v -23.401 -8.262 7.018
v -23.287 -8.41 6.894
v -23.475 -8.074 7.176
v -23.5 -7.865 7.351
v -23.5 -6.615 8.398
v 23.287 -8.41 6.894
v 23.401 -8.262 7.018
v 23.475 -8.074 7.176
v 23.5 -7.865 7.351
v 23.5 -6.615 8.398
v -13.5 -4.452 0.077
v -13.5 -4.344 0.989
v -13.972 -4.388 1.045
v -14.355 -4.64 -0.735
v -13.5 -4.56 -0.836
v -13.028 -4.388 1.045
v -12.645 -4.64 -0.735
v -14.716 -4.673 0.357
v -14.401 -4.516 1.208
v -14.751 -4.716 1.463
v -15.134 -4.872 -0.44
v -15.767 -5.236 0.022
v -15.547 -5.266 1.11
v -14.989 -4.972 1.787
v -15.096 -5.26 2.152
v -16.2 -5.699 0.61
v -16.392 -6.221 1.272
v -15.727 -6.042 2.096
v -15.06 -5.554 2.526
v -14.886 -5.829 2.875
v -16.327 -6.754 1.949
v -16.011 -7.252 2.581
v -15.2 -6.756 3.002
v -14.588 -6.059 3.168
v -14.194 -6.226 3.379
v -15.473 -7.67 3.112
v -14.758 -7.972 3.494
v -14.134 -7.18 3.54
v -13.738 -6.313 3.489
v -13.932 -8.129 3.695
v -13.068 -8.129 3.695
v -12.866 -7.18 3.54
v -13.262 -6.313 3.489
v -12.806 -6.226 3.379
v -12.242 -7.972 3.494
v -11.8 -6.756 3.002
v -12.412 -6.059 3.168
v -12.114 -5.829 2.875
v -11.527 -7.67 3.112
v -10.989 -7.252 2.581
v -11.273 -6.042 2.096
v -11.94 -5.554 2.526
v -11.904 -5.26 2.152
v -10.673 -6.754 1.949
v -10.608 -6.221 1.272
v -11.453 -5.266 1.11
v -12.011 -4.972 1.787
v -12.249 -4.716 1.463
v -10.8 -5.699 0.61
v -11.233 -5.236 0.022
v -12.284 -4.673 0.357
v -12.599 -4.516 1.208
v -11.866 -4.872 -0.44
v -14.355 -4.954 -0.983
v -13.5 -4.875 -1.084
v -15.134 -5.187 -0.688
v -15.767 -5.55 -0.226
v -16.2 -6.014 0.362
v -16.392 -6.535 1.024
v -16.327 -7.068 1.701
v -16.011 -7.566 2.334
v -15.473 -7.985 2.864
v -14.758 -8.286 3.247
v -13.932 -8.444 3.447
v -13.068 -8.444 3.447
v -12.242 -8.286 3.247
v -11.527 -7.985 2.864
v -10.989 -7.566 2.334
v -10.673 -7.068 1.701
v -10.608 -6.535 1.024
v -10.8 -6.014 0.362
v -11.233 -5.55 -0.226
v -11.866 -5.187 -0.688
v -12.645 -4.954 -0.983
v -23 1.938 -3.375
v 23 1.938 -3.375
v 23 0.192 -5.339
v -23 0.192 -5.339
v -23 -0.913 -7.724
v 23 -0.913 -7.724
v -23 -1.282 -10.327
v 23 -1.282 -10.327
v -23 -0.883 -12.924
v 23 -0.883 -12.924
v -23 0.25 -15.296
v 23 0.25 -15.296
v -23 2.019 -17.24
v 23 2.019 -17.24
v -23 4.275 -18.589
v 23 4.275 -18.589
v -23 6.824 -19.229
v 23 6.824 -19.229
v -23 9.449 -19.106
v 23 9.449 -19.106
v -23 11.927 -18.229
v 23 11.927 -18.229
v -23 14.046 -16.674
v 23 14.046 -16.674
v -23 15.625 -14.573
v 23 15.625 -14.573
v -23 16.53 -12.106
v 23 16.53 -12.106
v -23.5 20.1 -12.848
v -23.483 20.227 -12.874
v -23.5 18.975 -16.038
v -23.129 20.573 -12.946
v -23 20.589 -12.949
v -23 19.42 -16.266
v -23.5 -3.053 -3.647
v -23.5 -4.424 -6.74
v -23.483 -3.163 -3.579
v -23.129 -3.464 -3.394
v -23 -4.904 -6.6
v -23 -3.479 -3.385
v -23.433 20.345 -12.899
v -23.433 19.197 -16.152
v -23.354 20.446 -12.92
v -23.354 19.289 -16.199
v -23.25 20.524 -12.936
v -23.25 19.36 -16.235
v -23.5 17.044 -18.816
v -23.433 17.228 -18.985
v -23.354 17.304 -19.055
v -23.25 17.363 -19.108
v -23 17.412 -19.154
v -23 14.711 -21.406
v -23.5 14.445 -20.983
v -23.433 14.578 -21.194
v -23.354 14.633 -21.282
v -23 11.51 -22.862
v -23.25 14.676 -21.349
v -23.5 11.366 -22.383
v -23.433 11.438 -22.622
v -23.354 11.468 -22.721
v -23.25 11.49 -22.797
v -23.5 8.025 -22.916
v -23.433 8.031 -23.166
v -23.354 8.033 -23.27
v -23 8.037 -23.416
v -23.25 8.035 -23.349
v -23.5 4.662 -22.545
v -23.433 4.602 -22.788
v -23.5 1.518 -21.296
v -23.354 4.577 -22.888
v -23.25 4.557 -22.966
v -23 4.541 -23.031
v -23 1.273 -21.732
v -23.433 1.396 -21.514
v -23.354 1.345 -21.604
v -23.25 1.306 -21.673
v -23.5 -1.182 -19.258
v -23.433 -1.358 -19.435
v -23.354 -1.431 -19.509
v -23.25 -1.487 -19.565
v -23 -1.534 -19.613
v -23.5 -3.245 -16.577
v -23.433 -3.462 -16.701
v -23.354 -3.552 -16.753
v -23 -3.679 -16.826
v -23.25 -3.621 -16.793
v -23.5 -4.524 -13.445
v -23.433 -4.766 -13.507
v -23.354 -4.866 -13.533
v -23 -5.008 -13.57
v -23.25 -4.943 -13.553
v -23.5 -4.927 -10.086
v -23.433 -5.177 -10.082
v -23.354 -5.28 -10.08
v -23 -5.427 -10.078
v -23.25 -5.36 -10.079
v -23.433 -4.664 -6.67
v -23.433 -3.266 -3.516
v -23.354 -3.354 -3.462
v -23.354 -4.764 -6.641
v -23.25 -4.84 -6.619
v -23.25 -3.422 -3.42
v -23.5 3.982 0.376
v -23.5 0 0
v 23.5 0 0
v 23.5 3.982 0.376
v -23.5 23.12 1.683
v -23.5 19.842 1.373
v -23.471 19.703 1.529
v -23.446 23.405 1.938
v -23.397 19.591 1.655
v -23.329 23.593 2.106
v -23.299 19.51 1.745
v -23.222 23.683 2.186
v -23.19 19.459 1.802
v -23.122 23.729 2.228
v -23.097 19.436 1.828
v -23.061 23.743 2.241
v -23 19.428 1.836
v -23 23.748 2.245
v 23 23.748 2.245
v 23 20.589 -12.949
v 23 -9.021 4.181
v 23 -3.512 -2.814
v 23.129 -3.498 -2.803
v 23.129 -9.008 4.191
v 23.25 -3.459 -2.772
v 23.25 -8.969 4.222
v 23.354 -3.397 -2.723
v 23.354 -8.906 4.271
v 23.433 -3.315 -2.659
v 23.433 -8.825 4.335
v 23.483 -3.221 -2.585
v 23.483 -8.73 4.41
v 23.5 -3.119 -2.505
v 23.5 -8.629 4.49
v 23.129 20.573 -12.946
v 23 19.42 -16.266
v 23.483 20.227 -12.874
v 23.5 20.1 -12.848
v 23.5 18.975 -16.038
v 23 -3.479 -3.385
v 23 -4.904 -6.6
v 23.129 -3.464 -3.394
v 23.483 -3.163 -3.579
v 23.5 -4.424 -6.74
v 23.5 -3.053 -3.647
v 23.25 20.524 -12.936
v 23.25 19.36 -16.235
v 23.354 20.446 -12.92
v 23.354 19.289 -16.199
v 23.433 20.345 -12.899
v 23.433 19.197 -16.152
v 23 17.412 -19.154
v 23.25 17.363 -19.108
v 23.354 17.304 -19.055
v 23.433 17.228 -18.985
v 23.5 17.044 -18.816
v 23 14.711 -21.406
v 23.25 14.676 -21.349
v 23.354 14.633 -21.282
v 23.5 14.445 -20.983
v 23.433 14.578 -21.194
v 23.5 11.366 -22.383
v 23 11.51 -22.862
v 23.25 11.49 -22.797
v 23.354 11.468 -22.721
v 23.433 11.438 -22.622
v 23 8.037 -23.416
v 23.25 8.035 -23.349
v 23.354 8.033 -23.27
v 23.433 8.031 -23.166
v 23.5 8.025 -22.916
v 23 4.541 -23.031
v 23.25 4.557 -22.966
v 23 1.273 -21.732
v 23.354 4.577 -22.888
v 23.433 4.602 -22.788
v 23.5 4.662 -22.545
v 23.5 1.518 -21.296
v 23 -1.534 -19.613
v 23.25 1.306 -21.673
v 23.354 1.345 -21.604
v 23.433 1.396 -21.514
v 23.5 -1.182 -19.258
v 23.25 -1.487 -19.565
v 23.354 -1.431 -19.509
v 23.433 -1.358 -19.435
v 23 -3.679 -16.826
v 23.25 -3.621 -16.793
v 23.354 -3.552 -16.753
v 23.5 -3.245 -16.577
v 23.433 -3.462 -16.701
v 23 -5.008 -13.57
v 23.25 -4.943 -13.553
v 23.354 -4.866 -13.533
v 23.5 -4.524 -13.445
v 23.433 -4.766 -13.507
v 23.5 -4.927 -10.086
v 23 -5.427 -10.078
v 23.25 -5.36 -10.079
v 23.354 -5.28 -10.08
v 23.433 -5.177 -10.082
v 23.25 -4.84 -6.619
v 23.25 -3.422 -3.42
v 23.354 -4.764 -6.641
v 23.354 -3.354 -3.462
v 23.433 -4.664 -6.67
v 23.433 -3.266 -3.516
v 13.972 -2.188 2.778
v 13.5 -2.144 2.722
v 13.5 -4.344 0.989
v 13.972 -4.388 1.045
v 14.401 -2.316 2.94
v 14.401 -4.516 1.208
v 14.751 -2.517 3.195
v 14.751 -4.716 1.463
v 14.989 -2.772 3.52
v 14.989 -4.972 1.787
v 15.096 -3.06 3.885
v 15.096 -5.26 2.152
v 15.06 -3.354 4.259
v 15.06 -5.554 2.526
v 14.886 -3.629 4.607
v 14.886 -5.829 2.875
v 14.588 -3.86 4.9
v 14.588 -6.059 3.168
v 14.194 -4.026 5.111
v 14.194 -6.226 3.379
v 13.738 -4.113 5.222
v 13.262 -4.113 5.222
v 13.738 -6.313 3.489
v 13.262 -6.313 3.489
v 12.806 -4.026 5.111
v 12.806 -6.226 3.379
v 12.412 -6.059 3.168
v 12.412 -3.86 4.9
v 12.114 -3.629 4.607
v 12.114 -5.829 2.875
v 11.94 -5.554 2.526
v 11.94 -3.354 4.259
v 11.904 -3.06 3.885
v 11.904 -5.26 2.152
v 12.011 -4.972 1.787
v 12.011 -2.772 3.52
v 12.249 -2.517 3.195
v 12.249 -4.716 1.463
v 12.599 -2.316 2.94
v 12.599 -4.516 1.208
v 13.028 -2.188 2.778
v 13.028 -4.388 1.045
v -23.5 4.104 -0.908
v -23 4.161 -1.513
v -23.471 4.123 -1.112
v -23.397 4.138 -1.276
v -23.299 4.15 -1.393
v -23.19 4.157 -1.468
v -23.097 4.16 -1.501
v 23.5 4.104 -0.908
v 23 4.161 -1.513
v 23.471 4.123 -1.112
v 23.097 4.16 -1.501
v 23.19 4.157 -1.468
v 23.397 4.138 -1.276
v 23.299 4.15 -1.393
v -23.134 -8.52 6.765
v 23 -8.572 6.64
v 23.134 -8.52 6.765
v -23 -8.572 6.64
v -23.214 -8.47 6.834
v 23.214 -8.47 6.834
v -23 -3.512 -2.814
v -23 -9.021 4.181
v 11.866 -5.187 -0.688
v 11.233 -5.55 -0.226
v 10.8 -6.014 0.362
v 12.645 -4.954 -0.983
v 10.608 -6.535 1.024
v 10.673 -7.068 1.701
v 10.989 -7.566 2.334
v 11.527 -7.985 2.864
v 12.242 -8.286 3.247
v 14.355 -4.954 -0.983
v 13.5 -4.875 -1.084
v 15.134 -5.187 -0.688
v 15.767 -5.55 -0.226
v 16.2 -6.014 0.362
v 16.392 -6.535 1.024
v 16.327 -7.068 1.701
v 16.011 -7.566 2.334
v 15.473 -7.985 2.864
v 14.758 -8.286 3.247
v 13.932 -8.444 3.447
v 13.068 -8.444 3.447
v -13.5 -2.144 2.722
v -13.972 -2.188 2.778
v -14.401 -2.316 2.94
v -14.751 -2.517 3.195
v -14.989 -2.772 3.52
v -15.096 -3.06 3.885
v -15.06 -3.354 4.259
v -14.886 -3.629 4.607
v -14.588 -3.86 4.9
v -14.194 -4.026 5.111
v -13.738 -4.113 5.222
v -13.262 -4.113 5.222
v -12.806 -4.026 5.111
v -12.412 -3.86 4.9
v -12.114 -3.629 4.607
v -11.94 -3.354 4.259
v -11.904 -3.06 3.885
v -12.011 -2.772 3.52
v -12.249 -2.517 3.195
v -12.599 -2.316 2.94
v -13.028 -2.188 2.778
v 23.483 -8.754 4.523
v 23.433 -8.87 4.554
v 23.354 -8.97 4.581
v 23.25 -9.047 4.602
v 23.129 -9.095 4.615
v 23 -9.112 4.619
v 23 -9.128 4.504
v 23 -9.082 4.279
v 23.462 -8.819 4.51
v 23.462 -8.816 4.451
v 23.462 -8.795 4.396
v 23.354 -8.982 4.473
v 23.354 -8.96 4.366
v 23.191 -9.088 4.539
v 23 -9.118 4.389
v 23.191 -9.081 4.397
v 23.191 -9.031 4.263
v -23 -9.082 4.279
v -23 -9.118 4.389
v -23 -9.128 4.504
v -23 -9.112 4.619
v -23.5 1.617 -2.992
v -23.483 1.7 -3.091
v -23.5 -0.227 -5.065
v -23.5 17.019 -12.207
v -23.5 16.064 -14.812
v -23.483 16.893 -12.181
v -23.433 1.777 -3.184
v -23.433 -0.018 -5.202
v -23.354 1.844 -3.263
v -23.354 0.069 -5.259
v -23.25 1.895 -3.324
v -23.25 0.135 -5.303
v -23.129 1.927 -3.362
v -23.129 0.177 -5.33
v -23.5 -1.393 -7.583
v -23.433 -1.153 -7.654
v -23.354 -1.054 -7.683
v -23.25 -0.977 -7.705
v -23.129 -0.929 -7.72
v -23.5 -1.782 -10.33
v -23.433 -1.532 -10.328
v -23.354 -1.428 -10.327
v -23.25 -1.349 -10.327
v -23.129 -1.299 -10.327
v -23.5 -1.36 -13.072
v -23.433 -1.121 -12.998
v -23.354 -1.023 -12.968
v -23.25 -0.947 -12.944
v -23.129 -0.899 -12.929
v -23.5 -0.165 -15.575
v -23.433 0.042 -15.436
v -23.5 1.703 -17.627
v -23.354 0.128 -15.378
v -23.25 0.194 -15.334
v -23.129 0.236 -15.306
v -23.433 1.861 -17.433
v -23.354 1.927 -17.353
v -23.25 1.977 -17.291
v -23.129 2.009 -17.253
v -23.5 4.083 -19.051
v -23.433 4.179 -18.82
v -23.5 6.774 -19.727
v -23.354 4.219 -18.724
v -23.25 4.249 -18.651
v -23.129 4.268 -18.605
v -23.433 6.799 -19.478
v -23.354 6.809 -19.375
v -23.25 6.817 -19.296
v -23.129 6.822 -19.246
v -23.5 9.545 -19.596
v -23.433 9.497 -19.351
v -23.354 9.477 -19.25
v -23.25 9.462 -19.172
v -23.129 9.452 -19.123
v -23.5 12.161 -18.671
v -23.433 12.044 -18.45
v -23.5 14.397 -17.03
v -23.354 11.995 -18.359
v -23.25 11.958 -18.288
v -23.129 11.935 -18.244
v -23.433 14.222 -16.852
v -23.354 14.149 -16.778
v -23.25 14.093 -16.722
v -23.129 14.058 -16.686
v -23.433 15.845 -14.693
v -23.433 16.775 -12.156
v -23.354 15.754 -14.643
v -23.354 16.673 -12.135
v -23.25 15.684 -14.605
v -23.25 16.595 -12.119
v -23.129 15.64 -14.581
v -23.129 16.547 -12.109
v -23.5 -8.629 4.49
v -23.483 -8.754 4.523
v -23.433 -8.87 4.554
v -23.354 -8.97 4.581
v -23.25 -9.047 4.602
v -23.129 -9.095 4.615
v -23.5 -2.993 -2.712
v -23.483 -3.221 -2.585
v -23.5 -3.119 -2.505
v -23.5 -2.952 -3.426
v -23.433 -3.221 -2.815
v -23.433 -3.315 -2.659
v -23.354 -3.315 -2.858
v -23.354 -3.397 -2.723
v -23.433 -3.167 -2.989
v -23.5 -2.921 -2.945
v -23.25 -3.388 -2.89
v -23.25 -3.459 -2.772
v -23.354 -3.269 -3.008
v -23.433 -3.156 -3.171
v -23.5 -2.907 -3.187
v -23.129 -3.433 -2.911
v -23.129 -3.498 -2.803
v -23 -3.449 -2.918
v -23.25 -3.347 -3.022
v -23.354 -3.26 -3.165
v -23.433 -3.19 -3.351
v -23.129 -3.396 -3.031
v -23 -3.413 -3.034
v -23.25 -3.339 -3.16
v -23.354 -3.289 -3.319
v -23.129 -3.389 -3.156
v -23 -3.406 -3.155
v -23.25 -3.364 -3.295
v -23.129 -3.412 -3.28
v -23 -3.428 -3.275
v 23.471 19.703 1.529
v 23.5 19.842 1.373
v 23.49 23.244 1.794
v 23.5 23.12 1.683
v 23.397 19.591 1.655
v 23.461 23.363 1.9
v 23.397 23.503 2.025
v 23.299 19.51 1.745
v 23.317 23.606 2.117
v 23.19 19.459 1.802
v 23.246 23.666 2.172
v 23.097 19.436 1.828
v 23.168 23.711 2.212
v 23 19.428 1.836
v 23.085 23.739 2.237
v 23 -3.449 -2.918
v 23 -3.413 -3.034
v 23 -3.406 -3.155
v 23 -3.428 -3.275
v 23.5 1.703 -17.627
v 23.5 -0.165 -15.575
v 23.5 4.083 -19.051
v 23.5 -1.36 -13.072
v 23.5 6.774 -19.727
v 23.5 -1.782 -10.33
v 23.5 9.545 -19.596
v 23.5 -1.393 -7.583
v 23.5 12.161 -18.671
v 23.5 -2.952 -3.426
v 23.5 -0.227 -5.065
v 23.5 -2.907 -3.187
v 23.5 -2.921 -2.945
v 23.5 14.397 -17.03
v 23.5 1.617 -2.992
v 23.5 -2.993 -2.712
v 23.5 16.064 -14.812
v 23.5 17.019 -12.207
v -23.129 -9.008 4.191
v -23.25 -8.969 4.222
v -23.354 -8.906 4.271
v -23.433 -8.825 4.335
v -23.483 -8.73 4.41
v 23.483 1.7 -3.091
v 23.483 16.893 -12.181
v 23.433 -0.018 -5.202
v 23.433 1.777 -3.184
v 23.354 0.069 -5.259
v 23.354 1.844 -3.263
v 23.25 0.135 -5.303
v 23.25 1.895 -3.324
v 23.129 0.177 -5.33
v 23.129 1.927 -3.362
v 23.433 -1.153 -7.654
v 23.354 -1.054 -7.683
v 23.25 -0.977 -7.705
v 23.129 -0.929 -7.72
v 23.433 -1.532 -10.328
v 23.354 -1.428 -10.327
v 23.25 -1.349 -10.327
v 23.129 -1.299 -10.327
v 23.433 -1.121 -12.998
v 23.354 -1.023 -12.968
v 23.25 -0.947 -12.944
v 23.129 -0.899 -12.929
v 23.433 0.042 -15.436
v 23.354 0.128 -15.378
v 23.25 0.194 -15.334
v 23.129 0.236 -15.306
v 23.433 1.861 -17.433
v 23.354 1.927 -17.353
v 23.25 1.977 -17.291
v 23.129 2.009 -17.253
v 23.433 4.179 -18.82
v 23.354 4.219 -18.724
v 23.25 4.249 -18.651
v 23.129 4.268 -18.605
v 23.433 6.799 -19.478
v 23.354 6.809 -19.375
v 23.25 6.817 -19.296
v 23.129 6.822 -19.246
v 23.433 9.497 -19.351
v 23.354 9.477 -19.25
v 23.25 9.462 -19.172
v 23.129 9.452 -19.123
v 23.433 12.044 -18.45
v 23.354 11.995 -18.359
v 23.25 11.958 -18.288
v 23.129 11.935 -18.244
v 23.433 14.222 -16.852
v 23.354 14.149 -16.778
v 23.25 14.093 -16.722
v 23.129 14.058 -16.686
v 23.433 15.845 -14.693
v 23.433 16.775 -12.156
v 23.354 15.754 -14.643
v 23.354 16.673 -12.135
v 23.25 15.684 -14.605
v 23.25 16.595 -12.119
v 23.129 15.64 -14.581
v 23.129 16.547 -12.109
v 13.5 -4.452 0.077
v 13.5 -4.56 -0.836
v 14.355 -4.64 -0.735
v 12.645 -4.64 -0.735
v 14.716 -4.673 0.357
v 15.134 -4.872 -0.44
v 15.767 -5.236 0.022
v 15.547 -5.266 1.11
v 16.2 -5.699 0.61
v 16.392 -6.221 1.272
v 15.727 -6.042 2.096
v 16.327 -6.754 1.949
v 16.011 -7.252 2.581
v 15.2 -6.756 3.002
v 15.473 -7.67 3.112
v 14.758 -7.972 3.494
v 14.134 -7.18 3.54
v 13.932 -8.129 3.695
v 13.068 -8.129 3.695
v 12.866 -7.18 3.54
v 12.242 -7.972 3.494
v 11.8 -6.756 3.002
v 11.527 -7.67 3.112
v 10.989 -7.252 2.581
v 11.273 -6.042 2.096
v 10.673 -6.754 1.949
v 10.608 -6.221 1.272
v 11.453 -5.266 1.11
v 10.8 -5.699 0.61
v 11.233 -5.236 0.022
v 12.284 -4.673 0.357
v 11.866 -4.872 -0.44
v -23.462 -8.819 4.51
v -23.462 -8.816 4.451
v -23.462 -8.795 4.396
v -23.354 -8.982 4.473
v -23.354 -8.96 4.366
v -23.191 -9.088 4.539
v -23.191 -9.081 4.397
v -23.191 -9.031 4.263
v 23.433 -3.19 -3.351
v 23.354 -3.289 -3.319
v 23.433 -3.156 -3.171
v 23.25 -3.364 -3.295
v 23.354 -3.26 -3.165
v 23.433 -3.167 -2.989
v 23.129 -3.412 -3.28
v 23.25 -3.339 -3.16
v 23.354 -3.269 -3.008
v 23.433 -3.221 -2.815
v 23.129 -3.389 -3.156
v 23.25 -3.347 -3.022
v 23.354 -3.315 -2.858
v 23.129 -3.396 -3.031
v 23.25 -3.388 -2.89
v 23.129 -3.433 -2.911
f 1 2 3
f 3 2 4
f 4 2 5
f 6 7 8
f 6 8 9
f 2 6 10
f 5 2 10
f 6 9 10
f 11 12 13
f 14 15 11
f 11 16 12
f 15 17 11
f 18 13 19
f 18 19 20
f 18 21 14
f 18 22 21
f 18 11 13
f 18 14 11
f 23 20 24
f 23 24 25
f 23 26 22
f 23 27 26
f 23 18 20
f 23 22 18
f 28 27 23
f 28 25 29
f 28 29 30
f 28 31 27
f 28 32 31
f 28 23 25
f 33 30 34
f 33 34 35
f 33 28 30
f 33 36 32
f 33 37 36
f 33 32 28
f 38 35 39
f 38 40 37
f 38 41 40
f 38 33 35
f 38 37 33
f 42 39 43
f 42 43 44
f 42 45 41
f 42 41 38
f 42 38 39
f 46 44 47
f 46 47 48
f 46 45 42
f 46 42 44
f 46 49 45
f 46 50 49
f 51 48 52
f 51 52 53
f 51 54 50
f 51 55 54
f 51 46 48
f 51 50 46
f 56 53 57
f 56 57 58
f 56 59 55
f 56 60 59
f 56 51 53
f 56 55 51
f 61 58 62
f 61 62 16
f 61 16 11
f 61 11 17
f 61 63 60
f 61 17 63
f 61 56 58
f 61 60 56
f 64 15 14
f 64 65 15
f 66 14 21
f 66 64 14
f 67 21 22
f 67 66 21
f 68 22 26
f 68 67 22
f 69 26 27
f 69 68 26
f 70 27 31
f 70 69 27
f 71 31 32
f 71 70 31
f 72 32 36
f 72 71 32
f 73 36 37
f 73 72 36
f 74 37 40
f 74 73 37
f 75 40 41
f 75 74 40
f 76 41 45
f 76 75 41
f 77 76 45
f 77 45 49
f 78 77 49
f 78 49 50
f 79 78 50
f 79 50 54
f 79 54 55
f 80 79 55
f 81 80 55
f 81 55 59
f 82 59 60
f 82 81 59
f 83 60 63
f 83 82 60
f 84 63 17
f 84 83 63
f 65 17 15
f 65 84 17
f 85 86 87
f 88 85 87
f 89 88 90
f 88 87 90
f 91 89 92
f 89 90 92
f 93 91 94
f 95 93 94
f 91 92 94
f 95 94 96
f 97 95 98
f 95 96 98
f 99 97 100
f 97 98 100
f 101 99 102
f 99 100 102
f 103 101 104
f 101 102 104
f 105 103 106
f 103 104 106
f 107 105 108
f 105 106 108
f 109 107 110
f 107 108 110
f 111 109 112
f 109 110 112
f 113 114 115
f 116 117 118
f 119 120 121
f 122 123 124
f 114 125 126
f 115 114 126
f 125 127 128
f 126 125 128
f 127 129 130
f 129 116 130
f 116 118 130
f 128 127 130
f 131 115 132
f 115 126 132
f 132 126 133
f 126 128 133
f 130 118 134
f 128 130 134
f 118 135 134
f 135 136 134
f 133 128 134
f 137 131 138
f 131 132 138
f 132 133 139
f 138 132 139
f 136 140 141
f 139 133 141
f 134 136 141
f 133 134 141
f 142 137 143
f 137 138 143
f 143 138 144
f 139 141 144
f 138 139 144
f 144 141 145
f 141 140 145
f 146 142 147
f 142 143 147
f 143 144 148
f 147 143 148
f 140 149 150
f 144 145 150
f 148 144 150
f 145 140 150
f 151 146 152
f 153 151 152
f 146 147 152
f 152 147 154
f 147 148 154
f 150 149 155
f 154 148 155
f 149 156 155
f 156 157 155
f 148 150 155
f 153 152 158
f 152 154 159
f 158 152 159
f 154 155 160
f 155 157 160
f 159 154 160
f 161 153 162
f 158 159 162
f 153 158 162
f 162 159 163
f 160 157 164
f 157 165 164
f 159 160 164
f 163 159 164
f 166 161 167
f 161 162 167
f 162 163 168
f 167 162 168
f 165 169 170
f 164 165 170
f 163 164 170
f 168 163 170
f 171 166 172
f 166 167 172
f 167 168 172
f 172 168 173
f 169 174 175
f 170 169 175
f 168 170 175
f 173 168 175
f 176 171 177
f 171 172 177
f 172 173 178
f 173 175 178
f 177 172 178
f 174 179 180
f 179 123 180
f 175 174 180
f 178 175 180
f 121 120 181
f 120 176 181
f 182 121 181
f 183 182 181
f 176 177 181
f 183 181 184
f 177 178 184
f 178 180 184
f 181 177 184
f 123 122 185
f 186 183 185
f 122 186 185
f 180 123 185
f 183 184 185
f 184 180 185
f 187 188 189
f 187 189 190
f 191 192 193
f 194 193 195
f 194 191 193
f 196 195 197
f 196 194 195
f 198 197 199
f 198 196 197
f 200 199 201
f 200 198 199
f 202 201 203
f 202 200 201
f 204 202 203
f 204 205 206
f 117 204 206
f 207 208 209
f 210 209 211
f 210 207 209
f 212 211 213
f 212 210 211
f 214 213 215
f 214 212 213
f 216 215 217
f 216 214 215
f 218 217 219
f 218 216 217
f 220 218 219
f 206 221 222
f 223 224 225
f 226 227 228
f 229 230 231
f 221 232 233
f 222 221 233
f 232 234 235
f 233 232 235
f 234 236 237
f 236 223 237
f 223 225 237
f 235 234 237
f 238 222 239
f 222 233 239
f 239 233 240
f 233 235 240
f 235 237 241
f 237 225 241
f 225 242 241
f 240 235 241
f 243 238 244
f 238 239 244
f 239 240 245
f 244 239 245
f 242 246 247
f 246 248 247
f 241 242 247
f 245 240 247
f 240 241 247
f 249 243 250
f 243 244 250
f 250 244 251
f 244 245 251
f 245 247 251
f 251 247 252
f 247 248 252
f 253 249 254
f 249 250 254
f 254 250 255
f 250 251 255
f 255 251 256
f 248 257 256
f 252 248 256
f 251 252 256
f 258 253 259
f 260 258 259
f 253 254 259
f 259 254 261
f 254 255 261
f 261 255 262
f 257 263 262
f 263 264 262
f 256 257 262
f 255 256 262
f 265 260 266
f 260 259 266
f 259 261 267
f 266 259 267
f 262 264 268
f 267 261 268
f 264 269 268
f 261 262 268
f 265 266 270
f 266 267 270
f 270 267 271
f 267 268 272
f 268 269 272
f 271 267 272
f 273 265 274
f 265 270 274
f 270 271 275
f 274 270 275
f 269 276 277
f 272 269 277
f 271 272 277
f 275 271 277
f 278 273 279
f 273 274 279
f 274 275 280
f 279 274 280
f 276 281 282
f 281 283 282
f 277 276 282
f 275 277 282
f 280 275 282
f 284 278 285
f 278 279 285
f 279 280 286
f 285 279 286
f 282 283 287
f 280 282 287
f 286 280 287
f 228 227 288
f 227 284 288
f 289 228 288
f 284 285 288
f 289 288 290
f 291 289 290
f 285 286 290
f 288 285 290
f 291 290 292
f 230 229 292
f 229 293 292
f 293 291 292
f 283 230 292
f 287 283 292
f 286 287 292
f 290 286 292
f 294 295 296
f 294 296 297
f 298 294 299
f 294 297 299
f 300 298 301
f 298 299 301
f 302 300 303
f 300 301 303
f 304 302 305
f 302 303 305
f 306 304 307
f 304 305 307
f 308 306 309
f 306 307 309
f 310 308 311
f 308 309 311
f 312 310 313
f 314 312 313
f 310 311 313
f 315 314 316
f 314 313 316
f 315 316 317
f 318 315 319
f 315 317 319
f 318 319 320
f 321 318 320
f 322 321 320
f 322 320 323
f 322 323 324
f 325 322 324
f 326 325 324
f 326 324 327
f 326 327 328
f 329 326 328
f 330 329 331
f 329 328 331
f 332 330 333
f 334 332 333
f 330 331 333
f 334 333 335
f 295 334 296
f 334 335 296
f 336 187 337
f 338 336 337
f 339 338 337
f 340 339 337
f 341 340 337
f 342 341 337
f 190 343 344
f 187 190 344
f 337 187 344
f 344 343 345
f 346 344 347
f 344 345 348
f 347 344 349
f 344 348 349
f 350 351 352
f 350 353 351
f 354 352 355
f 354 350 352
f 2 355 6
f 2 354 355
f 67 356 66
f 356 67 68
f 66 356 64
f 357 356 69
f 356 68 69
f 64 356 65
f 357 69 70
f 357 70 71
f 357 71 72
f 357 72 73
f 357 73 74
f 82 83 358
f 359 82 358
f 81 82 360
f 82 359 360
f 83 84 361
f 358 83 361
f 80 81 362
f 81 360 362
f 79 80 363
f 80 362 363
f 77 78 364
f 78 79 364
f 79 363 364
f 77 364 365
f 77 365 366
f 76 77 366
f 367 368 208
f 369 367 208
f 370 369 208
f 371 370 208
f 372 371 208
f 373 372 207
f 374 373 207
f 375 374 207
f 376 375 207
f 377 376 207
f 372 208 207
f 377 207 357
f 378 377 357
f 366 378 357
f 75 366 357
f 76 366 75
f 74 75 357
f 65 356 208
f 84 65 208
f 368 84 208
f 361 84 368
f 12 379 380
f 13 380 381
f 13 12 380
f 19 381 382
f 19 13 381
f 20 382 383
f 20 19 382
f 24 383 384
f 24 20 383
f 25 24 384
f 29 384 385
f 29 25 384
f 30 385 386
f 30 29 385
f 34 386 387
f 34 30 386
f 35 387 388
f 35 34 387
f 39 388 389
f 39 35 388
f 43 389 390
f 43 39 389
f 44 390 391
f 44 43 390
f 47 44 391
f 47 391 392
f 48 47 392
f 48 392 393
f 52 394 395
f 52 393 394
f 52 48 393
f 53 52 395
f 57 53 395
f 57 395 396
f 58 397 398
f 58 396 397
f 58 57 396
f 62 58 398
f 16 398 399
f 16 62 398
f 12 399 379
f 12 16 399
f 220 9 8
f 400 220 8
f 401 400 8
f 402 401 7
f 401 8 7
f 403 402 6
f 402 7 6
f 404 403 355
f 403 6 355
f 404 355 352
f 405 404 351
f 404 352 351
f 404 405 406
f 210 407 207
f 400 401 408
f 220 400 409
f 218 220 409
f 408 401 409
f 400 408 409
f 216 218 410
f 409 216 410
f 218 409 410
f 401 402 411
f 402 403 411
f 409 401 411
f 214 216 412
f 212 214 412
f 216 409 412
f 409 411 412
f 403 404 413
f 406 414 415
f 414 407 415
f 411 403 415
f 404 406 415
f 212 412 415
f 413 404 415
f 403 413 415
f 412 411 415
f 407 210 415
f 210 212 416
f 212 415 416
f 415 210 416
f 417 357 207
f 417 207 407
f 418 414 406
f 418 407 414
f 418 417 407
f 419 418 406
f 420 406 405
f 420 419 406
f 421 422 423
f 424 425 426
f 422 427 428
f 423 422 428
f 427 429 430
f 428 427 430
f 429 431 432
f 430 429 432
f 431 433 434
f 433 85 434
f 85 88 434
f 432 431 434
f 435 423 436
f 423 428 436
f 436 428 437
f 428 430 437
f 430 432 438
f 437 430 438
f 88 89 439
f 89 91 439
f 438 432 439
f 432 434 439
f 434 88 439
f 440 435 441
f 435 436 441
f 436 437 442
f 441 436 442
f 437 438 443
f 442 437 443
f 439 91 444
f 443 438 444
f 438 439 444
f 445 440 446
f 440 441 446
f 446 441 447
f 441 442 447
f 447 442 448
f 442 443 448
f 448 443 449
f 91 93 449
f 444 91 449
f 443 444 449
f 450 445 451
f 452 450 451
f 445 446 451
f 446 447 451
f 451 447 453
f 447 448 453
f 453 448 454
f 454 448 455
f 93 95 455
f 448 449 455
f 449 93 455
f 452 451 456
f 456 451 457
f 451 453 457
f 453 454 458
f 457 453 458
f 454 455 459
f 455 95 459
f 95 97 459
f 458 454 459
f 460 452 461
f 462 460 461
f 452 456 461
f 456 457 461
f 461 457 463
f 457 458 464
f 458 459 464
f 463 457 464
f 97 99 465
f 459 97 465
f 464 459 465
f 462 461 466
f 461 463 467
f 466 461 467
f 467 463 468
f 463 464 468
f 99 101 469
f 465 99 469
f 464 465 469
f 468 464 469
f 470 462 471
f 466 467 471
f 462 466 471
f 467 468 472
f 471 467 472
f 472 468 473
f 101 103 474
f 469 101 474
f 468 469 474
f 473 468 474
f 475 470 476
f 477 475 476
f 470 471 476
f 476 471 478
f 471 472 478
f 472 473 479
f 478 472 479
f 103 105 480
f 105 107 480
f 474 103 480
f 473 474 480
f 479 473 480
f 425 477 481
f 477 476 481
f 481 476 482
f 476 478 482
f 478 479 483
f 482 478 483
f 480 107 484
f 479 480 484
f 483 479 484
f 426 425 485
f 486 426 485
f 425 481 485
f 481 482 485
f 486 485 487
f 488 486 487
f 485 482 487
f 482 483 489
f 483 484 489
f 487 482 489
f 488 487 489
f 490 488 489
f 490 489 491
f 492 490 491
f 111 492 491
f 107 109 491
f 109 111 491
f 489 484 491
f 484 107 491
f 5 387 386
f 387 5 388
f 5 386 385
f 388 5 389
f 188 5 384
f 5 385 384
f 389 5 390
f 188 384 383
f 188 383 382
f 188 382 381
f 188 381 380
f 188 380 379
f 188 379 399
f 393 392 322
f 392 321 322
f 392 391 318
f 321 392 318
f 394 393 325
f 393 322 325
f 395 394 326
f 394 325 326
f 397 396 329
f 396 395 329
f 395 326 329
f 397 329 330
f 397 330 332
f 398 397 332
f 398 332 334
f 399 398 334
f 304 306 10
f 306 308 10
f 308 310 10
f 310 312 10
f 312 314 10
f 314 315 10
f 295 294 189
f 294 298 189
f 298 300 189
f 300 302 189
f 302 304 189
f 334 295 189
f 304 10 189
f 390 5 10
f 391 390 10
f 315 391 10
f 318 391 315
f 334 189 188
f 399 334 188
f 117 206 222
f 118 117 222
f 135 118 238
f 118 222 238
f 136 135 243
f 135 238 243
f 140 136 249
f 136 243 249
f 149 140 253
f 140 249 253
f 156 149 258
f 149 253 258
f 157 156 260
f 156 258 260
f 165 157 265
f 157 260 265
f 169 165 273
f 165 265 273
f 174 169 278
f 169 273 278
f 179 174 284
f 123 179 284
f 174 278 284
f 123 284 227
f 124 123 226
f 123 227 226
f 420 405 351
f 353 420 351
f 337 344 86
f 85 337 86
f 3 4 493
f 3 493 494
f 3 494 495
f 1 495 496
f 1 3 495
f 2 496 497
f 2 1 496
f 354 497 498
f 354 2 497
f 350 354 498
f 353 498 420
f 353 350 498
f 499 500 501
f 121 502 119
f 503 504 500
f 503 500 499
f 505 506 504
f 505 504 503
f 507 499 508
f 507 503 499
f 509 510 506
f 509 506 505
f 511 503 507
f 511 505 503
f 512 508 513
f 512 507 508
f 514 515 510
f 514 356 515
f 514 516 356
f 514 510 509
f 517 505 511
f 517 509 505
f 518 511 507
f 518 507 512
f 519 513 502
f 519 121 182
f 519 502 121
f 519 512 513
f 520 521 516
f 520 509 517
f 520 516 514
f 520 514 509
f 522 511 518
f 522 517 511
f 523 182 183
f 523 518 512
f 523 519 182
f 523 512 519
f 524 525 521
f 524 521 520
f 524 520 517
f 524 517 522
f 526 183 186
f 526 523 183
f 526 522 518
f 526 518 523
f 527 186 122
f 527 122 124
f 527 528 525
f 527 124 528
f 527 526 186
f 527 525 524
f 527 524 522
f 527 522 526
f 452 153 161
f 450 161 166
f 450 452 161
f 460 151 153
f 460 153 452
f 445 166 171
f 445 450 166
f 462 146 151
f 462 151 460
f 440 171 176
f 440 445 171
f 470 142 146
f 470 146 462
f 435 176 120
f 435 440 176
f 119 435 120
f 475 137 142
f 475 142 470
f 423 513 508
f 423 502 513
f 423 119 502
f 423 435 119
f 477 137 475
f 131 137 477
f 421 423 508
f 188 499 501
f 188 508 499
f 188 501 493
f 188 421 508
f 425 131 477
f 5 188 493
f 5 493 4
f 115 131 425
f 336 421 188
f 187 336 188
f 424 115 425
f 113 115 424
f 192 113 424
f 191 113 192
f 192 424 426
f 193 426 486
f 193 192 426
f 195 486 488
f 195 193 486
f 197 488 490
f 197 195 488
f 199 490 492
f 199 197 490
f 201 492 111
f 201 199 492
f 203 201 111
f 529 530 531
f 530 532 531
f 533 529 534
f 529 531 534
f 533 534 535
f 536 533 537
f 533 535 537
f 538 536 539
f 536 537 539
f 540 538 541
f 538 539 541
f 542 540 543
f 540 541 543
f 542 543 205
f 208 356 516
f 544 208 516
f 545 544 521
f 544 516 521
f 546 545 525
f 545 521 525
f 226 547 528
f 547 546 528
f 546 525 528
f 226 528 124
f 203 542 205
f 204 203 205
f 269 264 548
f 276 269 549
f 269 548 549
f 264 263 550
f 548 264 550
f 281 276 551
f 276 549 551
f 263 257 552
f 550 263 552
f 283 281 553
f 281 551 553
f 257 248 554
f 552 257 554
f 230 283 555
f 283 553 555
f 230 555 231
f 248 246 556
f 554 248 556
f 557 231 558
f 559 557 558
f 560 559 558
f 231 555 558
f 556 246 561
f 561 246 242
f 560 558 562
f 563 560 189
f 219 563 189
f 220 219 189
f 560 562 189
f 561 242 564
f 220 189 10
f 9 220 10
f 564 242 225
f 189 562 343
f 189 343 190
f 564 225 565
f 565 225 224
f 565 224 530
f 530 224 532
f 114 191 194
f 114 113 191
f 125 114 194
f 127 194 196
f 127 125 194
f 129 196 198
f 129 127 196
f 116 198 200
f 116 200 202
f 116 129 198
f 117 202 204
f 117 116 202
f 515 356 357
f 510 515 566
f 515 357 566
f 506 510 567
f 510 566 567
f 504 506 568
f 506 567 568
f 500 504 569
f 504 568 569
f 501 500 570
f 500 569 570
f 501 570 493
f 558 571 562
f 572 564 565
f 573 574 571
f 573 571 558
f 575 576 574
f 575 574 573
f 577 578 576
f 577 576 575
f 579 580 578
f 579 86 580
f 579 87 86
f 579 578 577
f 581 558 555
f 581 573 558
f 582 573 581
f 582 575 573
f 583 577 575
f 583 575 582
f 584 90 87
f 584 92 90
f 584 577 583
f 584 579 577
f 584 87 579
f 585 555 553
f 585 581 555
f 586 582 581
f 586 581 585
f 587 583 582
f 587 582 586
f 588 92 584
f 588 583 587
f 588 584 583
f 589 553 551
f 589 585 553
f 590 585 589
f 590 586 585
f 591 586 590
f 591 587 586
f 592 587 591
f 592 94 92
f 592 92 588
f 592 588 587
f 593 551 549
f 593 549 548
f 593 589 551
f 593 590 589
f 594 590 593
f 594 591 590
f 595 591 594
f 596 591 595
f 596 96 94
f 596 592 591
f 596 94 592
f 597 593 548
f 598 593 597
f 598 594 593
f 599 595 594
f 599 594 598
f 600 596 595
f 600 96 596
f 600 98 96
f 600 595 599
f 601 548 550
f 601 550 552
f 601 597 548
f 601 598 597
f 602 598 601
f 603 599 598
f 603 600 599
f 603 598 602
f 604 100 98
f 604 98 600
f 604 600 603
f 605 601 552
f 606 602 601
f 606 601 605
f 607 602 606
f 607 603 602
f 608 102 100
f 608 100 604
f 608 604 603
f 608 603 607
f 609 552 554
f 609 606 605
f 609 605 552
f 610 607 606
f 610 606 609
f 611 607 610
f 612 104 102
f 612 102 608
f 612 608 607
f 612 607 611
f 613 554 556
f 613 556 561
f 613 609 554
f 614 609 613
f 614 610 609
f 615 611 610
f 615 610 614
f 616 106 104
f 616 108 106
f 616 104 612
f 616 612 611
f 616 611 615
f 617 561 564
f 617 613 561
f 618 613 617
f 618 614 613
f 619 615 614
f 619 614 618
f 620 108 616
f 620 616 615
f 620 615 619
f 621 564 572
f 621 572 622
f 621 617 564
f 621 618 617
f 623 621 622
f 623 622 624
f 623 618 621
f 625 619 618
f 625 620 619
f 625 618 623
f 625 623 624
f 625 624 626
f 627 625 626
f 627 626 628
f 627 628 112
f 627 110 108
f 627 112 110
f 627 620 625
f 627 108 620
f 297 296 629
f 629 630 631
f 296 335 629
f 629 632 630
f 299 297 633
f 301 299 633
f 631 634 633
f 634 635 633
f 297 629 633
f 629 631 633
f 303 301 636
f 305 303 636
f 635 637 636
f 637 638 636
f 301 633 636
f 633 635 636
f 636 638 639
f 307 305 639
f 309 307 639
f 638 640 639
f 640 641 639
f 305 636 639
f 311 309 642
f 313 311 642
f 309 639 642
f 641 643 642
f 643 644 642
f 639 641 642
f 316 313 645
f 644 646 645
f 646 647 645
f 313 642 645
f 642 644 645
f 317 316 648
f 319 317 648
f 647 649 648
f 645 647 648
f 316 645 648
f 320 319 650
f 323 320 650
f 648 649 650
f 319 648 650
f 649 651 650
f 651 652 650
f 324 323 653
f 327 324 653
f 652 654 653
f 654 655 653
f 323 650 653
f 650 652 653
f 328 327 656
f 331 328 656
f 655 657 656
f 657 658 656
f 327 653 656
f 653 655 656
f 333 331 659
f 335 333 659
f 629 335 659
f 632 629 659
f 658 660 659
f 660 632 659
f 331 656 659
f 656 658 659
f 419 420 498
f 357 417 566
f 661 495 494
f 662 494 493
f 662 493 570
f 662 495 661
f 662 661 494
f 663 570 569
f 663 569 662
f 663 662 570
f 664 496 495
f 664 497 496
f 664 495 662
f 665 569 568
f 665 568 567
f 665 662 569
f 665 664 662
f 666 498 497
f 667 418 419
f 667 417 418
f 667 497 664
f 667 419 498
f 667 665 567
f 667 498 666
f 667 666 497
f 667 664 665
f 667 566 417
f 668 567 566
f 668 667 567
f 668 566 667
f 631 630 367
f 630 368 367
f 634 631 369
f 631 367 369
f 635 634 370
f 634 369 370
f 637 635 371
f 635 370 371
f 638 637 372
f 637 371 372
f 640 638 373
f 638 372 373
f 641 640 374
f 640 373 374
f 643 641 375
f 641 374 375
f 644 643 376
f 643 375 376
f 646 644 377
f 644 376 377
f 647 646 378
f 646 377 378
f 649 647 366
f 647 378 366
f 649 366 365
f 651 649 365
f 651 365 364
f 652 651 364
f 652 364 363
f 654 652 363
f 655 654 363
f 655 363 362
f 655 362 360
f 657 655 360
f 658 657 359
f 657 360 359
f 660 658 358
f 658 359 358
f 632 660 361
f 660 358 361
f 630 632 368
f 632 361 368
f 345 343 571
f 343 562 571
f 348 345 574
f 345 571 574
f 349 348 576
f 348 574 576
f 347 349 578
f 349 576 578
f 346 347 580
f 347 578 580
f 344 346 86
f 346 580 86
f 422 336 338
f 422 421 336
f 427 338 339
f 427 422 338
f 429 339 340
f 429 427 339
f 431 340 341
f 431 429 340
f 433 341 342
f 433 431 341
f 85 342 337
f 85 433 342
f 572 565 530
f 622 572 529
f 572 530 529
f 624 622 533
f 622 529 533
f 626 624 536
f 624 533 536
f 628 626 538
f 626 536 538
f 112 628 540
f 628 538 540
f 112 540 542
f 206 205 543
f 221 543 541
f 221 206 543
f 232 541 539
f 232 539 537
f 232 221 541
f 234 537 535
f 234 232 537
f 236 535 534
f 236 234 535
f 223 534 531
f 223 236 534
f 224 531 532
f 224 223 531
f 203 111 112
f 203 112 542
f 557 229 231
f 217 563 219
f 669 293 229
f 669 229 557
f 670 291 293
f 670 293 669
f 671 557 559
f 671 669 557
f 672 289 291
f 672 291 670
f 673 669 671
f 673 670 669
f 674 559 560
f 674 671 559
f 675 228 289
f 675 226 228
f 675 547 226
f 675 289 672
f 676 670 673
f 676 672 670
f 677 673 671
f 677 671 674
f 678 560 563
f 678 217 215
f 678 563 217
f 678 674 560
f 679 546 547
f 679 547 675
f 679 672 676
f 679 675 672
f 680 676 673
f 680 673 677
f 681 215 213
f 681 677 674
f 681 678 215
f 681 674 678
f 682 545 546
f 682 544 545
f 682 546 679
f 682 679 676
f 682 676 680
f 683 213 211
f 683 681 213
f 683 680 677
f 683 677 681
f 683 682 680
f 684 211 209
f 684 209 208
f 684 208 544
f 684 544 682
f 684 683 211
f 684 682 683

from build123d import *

# Parameters (mm, degrees)
BOSS_EXTRU_1_DEPTH      = 23.5
BOSS_EXTRU_1_DEPTH_BACK = 23.5
CONG_1_R                = 0.5


with BuildPart() as part:
    # Esquisse1 → Boss.-Extru.1 (new, two sides: drawn at the far end of the back side and taken through both)
    with BuildSketch(Plane.ZY.offset(-BOSS_EXTRU_1_DEPTH_BACK)):
        with BuildLine():
            Line((-3.091898803, -3.292916778), (4.377181629, -9.176129997))
            Line((4.377181629, -9.176129997), (6.792591777, -8.531309234))
            Line((6.792591777, -8.531309234), (8.398220531, -6.615074305))
            Line((8.398220531, -6.615074305), (0, 0))
            Line((0, 0), (0.37642312, 3.982248816))
            Line((0.37642312, 3.982248816), (-1.512852543, 4.160833097))
            Line((-1.512852543, 4.160833097), (-3.375381898, 1.938000579))
            ThreePointArc((-3.375381898, 1.938000579), (-17.997095622, 3.097535614), (-12.105520327, 16.529898559))
            Line((-12.105520327, 16.529898559), (1.836440879, 19.428042878))
            Line((1.836440879, 19.428042878), (2.244776367, 23.747898452))
            Line((2.244776367, 23.747898452), (-12.949388907, 20.589455882))
            ThreePointArc((-12.949388907, 20.589455882), (-22.425731532, 2.702545011), (-3.091898803, -3.292916778))
        make_face()
    extrude(amount=BOSS_EXTRU_1_DEPTH + BOSS_EXTRU_1_DEPTH_BACK)

    # Esquisse2 → Fraisage pour vis à tête fraisée M31 (revolve, cut)
    with BuildSketch(Plane(origin=(-13.5, -6.669151695, 1.19442726), x_dir=(0, 0.6187737902502314, -0.7855692181465379), z_dir=(1, 0, 0))):
        Polygon((0, 0), (0, 10.96137699), (1.6, 10), (1.6, 1.7), (2.9, 0.4), (2.9, 0), align=None)
    fraisage_pour_vis_t_te_frais_e_m31 = revolve(axis=Axis((-13.5, -11.657516231, -2.734786308), (0, 0.7855692181465378, 0.6187737902502314)), mode=Mode.SUBTRACT)

    # Symétrie1: Fraisage pour vis à tête fraisée M31 across plane
    add(fraisage_pour_vis_t_te_frais_e_m31.mirror(Plane(origin=(0, 0, 0), x_dir=(0, 0, 1), z_dir=(1, 0, 0))), mode=Mode.SUBTRACT)

    # Congé1
    cong_1_edges = [part.edges().sort_by_distance(p)[0] for p in [
        (-23.5, 22.168677167, -5.35230627),
        (0, -8.531309234, 6.792591777),
        (0, -9.176129997, 4.377181629),
        (0, -3.292916778, -3.091898803),
        (-23.5, 21.587970665, 2.040608623),
        (-23.5, 17.978970719, -5.134539724),
        (-23.5, 3.097535614, -17.997095622),
        (-23.5, 3.049416838, -2.44411722),
        (-23.5, -8.853719615, 5.584886703),
        (-23.5, -6.234523387, 0.642641413),
        (-23.5, 2.702545011, -22.425731532),
        (23.5, 2.702545011, -22.425731532),
        (23.5, 22.168677167, -5.35230627),
        (23.5, 21.587970665, 2.040608623),
        (23.5, 17.978970719, -5.134539724),
        (23.5, 3.097535614, -17.997095622),
        (23.5, 3.049416838, -2.44411722),
        (23.5, -8.853719615, 5.584886703),
        (23.5, -6.234523387, 0.642641413),
    ]]
    fillet(cong_1_edges, radius=CONG_1_R)


solid = part.part
